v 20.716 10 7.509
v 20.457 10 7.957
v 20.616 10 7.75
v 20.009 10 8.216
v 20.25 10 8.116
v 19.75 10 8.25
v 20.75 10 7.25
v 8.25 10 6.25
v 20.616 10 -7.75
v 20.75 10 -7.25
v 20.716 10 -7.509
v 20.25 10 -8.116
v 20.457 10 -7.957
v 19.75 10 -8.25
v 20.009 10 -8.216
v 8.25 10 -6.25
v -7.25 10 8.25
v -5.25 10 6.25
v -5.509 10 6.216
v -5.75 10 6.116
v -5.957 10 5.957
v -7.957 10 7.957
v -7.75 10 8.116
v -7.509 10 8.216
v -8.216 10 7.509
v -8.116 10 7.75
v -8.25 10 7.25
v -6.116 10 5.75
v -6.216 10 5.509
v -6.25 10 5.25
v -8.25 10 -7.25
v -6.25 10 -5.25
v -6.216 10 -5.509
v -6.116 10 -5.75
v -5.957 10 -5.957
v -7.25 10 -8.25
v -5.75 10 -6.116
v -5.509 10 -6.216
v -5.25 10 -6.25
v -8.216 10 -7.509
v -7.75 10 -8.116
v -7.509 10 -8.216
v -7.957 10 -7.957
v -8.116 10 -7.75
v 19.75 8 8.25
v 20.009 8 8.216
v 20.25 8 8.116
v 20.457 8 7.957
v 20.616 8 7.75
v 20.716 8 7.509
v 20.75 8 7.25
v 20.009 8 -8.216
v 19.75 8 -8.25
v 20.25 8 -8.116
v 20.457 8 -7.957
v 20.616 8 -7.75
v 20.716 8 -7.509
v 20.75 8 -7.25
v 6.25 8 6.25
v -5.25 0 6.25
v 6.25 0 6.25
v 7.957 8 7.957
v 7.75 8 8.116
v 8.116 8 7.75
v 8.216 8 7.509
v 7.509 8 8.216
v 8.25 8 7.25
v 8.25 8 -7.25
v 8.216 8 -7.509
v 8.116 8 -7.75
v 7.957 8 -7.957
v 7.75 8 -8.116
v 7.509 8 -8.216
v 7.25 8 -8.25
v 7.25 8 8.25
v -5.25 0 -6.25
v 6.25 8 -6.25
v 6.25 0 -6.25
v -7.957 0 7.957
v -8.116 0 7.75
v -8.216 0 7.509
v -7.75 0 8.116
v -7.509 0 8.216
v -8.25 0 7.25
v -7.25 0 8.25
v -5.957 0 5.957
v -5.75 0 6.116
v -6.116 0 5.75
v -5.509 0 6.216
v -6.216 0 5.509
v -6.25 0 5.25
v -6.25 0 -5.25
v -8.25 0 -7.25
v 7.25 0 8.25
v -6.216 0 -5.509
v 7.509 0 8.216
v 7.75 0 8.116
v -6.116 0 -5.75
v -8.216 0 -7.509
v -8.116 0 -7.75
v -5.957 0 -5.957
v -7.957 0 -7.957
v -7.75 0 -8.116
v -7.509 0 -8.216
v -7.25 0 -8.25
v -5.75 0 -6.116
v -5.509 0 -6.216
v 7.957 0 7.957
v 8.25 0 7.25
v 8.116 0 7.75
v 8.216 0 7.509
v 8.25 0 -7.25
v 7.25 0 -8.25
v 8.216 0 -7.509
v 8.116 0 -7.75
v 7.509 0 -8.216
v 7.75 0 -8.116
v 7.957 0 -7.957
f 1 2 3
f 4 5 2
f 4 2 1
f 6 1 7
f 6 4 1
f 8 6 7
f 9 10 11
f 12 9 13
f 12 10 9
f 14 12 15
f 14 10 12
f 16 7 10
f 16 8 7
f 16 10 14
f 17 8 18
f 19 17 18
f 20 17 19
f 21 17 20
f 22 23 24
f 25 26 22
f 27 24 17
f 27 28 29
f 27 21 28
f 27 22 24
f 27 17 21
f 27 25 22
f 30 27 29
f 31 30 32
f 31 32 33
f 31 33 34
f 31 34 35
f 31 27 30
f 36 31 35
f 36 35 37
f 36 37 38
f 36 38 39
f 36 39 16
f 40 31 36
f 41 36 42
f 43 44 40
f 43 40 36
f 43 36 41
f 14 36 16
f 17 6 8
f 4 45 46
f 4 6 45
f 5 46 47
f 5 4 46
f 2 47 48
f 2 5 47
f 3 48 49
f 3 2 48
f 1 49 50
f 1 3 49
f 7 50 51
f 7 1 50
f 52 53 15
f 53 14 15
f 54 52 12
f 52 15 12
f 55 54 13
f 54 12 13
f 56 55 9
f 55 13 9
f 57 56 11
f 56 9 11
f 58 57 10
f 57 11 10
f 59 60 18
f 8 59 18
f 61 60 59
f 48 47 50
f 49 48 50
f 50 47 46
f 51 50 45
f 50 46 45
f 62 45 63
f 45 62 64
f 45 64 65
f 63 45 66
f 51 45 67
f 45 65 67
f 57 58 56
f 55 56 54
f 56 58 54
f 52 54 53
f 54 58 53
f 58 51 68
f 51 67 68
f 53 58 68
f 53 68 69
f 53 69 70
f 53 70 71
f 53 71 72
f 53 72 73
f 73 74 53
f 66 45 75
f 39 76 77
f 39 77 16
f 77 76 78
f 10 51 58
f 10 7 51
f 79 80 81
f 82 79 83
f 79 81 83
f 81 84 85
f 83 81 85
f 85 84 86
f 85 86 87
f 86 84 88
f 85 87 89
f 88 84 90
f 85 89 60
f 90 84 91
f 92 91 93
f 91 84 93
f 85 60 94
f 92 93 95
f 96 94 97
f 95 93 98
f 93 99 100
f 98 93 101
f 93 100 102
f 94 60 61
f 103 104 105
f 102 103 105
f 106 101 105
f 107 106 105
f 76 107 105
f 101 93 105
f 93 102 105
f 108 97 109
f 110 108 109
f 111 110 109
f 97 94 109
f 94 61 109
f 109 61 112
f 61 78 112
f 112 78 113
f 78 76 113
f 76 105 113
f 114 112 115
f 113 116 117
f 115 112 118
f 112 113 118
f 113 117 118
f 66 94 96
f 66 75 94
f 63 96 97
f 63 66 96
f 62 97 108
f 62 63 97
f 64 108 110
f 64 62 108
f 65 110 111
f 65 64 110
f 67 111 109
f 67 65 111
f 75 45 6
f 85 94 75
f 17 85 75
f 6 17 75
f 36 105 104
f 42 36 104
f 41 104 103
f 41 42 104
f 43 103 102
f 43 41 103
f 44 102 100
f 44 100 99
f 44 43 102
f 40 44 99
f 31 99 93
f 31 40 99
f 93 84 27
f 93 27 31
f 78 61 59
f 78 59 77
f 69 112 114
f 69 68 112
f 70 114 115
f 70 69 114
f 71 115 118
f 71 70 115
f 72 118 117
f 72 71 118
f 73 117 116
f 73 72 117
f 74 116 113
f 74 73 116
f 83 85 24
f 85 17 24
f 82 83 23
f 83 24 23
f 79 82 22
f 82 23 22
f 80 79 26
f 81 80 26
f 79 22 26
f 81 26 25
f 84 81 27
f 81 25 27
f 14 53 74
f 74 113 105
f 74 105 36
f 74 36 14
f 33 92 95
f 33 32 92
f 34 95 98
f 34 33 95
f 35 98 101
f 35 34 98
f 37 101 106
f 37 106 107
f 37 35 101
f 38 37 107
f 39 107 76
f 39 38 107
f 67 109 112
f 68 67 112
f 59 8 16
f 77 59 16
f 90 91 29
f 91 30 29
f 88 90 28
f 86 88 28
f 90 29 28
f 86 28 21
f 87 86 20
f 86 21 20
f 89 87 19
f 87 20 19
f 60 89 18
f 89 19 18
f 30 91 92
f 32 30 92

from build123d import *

# Parameters (mm, degrees)
CROQUIS1_W              = 16.5
CROQUIS1_H              = 16.5
CROQUIS1_W_2            = 12.5
CROQUIS1_H_2            = 12.5
SALIENTE_EXTRUIR1_DEPTH = 10
CHAFL_N1_SIZE           = 2
CROQUIS2_W              = 16.5
CROQUIS2_H              = 2
SALIENTE_EXTRUIR2_DEPTH = 12.5
REDONDEO1_R             = 1


with BuildPart() as part:
    # Croquis1 → Saliente-Extruir1 (new body)
    with BuildSketch(Plane(origin=(0, 0, 0), x_dir=(1, 0, 0), z_dir=(0, 1, 0))):
        Rectangle(CROQUIS1_W, CROQUIS1_H)
        Rectangle(CROQUIS1_W_2, CROQUIS1_H_2, mode=Mode.SUBTRACT)
    extrude(amount=SALIENTE_EXTRUIR1_DEPTH)

    # Chaflán1
    chafl_n1_edges = [part.edges().sort_by_distance(p)[0] for p in [
        (6.25, 10, 0),
    ]]
    chamfer(chafl_n1_edges, length=CHAFL_N1_SIZE - 0.0001)  # a hair under: the kernel refuses the full size

    # Croquis2 → Saliente-Extruir2 (add)
    with BuildSketch(Plane(origin=(8.25, 0, 0), x_dir=(0, 0, -1), z_dir=(1, 0, 0))):
        with Locations((0, 9)):
            Rectangle(CROQUIS2_W, CROQUIS2_H)
    extrude(amount=SALIENTE_EXTRUIR2_DEPTH)

    # Redondeo1
    redondeo1_edges = [part.edges().sort_by_distance(p)[0] for p in [
        (-6.25, 5, -6.25),
        (-6.25, 5, 6.25),
        (8.25, 4, -8.25),
        (8.25, 4, 8.25),
        (20.75, 9, 8.25),
        (20.75, 9, -8.25),
        (-8.25, 5, -8.25),
        (-8.25, 5, 8.25),
    ]]
    fillet(redondeo1_edges, radius=REDONDEO1_R)


solid = part.part
